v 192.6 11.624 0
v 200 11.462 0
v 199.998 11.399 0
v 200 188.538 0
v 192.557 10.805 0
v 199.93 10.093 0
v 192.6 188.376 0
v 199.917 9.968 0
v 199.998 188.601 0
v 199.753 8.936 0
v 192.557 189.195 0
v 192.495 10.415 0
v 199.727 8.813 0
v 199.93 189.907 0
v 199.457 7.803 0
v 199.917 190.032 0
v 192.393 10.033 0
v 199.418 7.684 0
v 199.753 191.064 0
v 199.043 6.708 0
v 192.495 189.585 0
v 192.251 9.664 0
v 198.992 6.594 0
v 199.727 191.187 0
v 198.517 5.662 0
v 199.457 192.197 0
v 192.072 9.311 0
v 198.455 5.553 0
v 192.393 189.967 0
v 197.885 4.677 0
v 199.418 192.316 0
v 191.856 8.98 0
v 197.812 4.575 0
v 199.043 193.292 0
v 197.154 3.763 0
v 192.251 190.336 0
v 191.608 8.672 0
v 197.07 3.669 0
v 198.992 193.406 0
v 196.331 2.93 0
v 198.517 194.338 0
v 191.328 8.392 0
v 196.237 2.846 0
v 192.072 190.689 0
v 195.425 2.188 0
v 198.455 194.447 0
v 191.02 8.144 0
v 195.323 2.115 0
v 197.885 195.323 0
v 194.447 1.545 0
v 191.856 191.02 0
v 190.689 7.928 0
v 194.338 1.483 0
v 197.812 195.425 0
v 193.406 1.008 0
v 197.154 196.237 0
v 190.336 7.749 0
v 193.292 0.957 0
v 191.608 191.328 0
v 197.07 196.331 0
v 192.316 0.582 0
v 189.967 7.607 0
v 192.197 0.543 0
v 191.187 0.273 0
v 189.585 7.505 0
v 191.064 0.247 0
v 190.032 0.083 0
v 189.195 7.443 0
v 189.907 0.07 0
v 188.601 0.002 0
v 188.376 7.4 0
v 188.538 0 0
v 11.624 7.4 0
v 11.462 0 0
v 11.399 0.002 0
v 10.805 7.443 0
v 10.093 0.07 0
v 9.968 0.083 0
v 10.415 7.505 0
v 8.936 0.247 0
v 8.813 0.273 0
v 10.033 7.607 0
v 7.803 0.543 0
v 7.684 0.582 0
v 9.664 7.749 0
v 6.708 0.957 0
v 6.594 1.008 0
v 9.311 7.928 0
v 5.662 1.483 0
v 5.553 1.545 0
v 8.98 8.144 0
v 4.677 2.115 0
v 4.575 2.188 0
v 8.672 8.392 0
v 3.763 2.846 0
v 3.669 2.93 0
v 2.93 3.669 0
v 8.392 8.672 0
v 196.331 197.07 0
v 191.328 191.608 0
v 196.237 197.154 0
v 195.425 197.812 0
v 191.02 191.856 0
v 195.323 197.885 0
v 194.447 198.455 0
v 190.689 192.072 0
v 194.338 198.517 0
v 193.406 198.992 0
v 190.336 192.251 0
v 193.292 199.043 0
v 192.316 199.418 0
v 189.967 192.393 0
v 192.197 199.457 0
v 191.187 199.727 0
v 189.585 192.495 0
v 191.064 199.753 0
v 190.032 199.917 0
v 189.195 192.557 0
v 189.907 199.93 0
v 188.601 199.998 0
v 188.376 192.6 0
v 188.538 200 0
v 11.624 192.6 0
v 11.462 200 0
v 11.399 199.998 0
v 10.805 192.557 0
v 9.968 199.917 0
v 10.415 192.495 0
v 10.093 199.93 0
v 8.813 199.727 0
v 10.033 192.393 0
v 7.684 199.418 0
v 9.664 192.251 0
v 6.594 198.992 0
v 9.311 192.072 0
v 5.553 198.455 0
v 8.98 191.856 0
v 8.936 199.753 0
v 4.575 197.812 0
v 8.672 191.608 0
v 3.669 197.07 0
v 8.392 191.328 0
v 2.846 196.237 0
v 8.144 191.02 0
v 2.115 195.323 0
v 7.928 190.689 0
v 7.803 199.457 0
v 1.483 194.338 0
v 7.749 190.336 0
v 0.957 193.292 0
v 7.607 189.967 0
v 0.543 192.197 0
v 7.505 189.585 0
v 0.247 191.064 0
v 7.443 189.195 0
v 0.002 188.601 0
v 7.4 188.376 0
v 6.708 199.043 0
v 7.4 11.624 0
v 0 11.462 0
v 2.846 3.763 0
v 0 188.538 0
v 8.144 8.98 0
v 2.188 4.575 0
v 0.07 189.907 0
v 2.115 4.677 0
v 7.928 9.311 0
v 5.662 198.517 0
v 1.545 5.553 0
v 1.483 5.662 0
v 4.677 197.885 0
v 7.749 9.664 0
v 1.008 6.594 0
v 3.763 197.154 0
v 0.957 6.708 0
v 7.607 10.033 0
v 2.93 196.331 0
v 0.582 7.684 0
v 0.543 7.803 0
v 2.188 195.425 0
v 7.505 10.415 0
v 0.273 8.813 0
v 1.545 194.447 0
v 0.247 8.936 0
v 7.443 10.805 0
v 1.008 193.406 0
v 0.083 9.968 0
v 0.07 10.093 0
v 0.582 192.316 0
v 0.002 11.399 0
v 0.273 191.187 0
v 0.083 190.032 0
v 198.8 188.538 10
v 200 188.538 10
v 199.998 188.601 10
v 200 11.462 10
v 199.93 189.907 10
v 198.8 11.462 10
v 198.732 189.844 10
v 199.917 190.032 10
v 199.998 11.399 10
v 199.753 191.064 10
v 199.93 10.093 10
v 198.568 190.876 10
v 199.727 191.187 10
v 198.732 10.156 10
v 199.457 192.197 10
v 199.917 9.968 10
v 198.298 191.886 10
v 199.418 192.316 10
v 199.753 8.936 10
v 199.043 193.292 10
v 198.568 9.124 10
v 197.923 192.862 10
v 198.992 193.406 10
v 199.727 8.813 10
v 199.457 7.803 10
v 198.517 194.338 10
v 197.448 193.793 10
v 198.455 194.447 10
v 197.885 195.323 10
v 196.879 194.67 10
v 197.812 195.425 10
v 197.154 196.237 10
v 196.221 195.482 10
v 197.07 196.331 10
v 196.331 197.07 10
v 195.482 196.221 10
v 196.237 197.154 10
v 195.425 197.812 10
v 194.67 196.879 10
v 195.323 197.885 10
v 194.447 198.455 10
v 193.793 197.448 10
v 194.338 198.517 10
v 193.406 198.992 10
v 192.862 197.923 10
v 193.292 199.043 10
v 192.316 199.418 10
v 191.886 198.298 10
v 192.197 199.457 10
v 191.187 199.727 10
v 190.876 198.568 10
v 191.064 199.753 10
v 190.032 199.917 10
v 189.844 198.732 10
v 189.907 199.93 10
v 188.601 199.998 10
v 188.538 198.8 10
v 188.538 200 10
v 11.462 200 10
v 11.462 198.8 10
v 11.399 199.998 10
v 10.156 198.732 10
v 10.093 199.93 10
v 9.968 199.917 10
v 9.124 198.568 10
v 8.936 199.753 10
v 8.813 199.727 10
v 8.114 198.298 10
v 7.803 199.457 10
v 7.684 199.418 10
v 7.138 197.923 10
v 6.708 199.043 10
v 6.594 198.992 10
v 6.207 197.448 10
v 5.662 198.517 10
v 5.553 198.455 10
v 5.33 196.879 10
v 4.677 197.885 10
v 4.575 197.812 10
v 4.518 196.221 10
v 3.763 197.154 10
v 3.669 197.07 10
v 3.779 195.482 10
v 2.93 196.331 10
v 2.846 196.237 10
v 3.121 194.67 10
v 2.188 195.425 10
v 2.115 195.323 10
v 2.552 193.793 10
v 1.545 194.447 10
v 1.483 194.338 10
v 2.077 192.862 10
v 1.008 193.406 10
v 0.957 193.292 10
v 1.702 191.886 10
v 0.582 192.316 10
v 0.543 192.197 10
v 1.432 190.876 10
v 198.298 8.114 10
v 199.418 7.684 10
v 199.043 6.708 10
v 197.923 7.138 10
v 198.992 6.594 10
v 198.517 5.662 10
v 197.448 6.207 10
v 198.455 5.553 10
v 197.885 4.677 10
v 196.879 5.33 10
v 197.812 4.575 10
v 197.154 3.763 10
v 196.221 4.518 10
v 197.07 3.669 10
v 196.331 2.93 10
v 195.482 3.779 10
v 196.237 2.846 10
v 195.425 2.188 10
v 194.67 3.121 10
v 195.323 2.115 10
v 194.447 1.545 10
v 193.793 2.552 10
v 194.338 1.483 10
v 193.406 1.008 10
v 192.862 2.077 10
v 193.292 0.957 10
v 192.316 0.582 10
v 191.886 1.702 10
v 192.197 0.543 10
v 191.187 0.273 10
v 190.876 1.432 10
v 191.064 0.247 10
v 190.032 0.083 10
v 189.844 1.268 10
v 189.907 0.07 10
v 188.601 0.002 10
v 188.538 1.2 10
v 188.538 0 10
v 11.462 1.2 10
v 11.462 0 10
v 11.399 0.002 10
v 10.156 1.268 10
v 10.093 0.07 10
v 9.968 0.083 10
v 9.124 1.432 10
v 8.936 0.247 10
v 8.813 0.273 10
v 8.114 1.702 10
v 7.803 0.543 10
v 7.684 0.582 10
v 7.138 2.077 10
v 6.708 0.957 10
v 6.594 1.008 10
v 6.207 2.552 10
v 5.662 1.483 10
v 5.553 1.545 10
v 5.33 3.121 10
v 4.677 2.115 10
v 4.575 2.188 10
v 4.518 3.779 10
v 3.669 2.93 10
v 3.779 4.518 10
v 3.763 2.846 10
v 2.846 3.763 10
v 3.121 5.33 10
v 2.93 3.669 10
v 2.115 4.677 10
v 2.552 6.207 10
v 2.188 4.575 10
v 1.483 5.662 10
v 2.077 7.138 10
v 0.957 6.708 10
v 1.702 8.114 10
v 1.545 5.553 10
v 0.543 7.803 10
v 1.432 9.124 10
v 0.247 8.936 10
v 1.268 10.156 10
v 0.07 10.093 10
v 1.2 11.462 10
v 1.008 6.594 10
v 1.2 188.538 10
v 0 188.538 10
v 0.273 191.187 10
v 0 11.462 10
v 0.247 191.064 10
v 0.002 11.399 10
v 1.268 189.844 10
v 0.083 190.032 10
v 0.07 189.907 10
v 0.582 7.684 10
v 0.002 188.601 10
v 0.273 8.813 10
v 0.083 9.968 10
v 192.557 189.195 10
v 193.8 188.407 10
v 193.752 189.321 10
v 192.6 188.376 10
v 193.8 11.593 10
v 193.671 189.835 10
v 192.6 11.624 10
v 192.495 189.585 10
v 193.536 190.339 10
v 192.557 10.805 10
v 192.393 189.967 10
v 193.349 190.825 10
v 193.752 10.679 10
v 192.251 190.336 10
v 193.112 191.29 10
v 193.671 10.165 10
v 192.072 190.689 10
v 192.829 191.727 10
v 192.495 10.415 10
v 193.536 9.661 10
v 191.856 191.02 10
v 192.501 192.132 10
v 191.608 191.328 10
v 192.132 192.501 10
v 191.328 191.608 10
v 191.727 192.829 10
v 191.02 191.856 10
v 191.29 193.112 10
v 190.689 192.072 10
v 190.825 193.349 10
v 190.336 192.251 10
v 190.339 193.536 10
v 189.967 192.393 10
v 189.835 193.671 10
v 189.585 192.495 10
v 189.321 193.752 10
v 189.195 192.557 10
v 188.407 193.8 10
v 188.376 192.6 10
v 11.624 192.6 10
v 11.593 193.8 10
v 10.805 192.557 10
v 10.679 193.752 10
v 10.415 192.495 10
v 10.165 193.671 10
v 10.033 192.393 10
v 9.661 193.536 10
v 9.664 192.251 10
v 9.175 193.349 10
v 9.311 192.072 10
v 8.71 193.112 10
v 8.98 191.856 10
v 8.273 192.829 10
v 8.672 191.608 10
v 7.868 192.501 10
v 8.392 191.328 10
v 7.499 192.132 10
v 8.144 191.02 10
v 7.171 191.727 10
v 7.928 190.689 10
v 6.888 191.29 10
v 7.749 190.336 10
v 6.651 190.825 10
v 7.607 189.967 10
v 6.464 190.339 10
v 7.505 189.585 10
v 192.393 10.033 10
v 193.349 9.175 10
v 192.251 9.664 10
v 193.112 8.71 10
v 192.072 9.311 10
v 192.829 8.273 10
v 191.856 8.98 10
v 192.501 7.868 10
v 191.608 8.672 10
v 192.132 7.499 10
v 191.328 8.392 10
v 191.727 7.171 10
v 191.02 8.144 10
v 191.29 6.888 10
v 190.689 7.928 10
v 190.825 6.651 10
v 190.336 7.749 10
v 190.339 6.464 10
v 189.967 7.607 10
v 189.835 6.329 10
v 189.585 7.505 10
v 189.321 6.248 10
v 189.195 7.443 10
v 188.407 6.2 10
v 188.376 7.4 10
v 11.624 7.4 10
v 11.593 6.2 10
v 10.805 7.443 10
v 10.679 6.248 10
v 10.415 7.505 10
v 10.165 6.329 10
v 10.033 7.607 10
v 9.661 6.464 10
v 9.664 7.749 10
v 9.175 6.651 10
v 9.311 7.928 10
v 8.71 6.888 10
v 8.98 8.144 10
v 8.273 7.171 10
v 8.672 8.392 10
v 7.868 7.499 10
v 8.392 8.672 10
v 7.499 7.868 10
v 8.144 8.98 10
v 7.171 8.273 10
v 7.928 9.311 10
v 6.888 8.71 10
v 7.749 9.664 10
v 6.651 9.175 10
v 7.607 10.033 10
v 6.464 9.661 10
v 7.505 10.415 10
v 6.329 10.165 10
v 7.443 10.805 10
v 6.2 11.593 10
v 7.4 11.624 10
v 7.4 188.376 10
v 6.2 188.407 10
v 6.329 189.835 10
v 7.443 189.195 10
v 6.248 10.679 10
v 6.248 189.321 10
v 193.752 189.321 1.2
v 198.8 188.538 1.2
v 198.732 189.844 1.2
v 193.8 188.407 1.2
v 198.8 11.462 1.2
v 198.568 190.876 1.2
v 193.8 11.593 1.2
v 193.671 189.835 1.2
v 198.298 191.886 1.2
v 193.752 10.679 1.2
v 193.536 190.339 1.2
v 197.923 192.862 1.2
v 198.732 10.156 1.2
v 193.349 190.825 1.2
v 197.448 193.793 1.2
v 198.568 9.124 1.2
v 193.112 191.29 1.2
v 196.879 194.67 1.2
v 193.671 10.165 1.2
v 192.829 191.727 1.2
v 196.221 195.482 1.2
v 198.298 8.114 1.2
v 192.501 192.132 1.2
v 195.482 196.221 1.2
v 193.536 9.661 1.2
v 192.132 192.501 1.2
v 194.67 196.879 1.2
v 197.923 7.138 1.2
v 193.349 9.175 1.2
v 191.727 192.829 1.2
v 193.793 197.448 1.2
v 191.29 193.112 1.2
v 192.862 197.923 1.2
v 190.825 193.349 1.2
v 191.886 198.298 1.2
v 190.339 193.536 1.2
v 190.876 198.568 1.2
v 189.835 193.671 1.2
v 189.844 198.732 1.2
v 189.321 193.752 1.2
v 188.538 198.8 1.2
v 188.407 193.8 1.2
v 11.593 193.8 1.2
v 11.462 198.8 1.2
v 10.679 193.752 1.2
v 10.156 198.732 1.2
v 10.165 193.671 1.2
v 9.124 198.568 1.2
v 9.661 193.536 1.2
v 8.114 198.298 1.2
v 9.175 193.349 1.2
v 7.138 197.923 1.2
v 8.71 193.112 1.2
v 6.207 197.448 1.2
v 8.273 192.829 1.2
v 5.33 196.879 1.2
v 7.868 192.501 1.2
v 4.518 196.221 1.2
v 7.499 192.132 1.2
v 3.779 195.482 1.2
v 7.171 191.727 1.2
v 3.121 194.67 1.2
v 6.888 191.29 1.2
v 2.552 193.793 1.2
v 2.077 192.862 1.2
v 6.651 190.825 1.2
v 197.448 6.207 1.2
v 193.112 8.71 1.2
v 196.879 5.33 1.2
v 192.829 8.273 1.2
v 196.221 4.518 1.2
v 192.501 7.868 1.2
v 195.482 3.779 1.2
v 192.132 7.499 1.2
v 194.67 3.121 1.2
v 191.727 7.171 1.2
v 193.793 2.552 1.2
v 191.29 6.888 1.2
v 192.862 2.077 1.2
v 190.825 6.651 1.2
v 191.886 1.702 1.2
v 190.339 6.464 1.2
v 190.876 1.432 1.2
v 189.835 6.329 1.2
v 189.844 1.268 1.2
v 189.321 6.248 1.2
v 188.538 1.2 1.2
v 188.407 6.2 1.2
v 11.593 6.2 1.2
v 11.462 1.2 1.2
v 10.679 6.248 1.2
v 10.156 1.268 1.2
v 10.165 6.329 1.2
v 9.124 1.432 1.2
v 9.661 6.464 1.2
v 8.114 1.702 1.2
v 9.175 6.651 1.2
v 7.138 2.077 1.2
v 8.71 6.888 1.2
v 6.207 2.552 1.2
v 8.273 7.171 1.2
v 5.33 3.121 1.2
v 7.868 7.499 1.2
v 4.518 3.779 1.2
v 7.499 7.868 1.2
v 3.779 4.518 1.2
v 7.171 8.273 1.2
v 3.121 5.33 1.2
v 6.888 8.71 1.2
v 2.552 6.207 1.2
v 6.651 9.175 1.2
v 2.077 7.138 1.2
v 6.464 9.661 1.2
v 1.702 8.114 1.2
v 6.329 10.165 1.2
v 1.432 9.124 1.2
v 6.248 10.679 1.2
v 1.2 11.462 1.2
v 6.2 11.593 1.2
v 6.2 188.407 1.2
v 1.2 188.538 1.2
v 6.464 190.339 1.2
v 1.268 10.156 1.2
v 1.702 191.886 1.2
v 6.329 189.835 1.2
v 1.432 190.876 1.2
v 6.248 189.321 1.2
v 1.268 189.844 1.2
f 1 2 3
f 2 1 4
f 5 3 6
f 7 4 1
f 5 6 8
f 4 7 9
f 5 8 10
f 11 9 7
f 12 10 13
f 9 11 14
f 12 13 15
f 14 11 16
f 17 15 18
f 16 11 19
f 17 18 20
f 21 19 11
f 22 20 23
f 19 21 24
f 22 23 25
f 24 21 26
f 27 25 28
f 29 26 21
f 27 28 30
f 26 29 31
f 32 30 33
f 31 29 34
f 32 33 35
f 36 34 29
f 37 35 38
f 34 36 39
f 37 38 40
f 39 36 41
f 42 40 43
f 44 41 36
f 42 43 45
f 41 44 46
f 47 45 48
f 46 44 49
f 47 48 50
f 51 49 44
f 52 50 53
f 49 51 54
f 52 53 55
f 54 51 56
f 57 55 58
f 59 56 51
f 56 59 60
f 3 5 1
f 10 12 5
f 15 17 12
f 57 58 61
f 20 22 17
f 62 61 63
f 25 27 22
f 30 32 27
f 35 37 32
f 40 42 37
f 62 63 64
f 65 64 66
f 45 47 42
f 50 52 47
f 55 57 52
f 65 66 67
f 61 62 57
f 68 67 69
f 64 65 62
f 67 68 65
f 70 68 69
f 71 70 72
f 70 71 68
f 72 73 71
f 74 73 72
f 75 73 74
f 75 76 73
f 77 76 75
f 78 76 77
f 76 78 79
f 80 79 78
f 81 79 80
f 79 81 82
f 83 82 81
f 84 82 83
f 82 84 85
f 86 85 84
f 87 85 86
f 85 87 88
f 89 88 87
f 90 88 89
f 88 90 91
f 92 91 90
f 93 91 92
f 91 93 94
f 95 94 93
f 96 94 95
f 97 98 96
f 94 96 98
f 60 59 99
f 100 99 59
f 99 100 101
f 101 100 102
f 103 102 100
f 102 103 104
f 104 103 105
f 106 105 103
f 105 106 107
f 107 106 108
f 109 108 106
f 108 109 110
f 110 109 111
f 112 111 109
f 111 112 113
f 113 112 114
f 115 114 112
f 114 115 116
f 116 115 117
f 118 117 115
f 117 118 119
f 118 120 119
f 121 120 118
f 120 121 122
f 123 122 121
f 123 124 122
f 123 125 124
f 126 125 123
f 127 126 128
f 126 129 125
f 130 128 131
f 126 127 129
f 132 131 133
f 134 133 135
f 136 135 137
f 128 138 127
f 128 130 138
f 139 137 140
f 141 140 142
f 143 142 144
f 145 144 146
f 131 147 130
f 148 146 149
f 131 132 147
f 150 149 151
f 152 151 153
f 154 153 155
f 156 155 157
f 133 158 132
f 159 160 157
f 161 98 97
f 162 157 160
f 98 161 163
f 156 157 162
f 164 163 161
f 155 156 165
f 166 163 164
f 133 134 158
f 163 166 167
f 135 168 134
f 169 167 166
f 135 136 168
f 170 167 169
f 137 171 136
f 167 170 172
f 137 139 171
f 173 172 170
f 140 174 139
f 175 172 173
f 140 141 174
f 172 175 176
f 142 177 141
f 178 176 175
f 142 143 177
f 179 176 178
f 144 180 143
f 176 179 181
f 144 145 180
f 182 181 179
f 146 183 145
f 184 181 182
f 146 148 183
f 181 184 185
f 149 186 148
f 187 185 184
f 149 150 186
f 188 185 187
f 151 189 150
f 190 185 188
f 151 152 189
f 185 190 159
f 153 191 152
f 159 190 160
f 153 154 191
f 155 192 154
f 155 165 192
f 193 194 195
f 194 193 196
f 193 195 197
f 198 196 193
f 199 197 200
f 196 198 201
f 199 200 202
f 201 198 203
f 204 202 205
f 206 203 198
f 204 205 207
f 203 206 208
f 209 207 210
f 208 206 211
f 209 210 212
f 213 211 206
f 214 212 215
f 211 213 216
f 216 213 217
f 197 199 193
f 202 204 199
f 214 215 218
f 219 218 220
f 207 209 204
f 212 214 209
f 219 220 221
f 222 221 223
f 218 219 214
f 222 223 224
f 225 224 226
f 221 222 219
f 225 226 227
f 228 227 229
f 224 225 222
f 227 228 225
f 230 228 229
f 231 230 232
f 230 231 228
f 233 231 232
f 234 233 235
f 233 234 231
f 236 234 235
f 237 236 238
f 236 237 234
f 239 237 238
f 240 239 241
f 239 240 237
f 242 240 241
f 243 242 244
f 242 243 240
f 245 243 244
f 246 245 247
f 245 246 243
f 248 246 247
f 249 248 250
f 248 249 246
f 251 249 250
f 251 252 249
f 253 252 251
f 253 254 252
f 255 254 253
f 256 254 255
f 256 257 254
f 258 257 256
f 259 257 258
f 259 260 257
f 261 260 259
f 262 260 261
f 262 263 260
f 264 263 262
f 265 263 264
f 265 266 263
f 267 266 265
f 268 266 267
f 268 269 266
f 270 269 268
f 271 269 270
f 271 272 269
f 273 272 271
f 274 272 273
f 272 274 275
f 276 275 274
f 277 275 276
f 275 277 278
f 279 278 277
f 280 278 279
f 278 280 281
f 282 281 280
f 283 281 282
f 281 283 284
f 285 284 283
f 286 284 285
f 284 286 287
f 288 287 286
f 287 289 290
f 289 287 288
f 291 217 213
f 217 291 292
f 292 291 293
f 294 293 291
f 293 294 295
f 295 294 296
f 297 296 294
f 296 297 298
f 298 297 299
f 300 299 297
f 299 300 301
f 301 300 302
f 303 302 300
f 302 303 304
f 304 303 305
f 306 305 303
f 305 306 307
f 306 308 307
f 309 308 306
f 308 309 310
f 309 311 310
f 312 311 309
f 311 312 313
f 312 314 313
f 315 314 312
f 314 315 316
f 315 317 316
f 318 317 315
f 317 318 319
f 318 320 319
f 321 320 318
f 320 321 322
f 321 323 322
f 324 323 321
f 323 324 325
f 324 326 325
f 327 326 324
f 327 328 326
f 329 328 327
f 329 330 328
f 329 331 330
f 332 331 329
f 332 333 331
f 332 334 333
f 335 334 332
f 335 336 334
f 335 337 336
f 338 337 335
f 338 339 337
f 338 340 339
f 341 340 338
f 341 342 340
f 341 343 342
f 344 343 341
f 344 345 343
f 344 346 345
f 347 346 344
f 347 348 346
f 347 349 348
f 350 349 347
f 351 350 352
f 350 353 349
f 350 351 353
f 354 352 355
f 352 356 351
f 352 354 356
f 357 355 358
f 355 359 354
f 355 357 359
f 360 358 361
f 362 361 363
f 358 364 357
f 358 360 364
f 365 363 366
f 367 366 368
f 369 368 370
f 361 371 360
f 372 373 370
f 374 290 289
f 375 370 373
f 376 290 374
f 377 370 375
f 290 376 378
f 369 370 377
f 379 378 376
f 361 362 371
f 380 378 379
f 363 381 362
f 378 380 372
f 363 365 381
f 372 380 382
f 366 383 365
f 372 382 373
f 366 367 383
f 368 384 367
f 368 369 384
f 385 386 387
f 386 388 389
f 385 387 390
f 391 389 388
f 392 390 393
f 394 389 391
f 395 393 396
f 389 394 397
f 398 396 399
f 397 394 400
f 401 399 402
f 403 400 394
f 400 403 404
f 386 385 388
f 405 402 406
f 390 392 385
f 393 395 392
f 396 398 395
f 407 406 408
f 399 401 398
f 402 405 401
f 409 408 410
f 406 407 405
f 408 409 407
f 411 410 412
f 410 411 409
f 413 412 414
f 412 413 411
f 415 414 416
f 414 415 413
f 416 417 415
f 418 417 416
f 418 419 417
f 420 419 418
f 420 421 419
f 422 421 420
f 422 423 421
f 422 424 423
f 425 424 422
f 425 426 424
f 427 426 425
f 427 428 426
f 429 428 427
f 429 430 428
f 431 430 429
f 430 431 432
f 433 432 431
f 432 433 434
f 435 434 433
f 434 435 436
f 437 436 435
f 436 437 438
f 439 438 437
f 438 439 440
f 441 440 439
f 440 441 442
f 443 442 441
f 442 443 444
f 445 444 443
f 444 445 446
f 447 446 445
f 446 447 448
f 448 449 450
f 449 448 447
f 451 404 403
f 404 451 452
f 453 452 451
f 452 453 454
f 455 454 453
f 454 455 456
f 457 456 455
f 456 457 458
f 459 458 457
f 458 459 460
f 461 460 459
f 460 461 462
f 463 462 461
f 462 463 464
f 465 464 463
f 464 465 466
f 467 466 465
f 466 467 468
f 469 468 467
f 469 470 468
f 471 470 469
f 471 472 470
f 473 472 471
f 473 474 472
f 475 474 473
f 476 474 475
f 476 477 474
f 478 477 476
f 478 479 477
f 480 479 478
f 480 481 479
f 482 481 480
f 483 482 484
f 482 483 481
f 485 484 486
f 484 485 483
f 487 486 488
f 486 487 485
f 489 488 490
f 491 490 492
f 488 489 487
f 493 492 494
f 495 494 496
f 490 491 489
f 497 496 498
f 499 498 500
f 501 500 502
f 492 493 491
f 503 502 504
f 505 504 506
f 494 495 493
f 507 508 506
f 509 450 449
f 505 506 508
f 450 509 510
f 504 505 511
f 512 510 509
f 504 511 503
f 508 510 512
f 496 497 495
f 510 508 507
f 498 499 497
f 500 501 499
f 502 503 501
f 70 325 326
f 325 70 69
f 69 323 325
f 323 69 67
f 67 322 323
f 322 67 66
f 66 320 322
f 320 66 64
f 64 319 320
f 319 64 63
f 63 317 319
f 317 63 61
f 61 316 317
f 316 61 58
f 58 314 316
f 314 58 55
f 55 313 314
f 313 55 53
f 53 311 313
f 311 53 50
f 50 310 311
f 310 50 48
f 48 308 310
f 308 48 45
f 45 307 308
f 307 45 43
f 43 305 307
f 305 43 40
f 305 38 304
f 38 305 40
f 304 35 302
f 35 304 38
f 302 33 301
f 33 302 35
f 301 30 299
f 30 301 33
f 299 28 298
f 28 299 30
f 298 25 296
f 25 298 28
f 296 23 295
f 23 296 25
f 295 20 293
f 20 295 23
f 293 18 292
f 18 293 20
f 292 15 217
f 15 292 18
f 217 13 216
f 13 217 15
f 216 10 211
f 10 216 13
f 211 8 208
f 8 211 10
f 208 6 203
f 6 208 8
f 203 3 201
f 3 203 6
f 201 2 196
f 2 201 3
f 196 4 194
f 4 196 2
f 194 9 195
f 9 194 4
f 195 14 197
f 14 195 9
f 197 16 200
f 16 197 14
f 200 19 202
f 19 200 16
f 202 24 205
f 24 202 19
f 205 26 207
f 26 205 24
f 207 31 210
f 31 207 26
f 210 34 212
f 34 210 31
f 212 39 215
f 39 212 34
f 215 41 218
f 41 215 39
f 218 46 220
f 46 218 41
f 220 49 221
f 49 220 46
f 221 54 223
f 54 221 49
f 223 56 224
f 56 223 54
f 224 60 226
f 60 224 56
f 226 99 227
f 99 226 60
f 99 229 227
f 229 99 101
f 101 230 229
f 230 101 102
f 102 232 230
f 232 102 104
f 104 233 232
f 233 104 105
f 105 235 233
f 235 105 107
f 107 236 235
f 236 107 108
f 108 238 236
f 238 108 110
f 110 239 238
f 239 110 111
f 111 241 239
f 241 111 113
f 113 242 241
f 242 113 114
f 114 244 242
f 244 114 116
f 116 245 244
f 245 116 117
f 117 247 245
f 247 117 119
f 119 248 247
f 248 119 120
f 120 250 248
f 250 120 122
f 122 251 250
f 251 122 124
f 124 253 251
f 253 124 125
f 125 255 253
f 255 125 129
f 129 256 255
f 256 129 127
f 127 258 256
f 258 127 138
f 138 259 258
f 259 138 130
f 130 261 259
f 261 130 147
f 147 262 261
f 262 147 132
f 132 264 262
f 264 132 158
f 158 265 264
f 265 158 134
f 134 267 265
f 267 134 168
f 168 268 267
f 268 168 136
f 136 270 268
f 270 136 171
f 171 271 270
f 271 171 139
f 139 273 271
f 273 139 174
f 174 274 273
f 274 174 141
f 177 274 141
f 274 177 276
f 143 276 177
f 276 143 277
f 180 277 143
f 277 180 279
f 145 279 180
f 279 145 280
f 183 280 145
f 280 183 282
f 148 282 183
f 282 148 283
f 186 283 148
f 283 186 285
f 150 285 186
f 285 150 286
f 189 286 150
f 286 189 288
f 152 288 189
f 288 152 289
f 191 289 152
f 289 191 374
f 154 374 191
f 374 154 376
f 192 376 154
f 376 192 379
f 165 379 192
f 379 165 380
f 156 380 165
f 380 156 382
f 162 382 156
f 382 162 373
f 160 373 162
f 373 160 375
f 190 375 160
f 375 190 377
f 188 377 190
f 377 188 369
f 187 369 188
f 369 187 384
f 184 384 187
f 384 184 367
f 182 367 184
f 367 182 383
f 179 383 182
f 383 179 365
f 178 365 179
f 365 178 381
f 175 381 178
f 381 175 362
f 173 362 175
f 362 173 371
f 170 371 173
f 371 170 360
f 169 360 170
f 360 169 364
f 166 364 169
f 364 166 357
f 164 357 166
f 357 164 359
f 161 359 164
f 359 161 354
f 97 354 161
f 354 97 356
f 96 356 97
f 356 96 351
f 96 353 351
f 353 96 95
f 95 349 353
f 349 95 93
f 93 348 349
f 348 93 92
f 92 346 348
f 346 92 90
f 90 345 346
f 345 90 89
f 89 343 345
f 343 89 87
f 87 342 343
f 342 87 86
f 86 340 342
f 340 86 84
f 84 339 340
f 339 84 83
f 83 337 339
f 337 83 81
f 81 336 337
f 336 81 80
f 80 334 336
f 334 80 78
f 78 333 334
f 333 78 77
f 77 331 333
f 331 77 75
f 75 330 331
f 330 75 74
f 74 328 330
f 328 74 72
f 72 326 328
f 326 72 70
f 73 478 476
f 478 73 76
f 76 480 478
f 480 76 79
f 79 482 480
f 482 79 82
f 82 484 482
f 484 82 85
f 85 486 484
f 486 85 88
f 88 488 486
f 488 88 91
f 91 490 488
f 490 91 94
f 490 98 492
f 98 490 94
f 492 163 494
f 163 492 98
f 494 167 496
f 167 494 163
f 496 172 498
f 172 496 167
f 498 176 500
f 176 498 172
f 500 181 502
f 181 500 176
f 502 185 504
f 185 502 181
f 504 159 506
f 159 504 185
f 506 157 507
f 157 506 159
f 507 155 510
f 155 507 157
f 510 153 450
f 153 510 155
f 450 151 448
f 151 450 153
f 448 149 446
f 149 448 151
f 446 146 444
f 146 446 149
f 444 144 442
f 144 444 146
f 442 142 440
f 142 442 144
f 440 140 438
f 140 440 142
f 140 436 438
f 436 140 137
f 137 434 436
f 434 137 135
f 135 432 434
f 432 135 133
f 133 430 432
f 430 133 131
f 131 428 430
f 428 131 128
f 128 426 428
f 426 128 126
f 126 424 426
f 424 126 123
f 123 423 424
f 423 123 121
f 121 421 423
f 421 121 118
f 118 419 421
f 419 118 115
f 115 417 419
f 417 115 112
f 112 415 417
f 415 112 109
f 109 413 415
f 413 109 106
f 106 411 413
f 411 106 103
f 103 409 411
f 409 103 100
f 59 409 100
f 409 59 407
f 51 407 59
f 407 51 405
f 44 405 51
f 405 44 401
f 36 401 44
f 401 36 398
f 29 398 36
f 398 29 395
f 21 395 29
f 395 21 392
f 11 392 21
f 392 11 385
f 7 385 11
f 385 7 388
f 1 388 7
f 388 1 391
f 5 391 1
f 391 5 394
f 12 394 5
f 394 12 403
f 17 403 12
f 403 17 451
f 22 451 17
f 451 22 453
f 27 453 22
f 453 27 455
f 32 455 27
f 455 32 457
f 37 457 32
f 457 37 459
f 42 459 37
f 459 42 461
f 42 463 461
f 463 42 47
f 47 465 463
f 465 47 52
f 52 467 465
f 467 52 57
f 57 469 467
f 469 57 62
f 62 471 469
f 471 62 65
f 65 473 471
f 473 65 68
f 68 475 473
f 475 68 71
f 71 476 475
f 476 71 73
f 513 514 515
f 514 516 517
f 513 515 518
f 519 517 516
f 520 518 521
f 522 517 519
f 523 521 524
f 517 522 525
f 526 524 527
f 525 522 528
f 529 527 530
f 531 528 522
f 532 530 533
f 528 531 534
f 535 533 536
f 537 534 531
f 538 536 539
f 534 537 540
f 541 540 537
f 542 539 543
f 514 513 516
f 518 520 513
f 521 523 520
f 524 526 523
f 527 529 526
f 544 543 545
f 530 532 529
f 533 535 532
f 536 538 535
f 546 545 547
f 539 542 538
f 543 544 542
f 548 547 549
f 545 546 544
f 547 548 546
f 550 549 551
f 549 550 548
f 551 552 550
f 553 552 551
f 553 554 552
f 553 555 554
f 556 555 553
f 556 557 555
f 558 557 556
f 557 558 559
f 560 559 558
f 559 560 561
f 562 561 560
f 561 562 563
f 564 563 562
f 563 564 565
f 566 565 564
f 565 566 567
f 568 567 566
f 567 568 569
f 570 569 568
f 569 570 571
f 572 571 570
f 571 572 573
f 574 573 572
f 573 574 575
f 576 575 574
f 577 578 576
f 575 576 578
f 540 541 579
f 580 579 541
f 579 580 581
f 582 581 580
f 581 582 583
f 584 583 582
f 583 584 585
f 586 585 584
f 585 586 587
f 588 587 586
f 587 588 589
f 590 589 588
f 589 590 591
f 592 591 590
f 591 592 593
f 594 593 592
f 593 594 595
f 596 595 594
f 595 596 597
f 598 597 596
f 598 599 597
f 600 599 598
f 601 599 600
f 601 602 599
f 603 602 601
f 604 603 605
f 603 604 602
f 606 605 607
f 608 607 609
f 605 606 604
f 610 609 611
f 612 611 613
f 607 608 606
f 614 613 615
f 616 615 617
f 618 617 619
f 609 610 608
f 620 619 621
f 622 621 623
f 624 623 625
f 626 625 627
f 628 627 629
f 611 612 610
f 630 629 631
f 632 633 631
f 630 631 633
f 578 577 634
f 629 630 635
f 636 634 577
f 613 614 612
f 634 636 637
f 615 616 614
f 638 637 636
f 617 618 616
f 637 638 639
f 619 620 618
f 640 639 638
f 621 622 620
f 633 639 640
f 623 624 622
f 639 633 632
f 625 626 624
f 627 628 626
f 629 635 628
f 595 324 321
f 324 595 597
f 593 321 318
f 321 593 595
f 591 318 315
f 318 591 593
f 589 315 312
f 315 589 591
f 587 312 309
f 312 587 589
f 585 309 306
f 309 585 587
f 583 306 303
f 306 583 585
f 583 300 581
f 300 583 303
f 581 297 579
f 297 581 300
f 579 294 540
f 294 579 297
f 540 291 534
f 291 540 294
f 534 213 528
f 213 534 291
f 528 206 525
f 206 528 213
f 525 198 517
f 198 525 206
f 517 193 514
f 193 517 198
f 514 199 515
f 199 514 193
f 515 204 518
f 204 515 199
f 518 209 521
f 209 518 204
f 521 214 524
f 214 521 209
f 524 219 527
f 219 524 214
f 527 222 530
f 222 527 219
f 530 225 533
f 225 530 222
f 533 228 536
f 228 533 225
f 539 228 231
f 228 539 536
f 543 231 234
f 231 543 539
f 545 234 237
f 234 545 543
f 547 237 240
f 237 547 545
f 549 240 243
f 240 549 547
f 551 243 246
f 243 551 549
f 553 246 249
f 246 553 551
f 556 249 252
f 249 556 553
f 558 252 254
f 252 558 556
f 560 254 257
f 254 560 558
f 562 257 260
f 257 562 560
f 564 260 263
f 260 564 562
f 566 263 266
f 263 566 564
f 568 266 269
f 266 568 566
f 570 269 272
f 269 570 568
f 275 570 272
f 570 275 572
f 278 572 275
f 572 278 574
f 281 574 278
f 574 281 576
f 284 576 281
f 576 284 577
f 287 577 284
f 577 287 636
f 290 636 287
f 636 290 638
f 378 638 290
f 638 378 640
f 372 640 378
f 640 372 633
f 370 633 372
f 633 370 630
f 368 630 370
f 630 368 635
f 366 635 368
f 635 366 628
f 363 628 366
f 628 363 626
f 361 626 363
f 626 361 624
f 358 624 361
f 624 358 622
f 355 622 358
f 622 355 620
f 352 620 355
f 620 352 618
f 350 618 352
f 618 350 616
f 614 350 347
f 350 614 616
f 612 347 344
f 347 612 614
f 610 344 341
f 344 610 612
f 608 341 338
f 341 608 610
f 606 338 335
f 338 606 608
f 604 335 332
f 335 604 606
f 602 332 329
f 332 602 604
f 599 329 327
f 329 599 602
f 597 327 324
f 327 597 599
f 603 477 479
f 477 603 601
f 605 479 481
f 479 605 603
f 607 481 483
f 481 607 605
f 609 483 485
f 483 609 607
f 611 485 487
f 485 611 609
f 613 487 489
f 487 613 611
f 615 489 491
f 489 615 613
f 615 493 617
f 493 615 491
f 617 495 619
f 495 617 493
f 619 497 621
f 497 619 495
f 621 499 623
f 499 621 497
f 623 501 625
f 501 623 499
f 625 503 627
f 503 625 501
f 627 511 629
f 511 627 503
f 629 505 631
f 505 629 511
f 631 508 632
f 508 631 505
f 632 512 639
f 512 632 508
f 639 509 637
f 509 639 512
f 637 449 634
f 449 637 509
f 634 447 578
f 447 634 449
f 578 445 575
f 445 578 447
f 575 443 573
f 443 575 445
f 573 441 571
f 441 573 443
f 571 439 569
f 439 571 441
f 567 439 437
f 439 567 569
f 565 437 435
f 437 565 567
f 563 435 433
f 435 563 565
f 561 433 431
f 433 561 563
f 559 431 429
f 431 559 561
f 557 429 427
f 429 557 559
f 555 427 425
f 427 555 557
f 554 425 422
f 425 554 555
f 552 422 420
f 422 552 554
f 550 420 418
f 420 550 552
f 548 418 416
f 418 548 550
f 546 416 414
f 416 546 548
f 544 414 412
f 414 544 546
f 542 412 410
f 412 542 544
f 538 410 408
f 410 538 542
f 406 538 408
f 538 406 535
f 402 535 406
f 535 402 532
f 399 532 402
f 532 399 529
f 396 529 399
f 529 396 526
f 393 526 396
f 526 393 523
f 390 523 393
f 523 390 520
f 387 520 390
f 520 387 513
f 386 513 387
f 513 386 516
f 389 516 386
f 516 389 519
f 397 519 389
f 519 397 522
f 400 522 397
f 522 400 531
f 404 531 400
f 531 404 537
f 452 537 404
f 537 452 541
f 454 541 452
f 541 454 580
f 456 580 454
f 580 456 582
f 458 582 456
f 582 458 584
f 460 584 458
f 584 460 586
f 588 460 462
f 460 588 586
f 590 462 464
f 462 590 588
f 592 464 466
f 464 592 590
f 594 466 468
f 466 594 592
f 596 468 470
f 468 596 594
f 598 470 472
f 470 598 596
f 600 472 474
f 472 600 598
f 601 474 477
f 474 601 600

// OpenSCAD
// file: include/LEDneon.scad
// OpenSCAD LED neon modules
// to be included in own OpenSCAD scripts
//

module roundoff2d(rr=20) {
    offset(r=-rr/2)
        offset(r=rr)
            children();
}

module genslot2d(sw=5) {
    difference() {
        children();
        offset(r=-sw)
            children();
    }
}

module genslot3d(sw=5, rr=20, h=10) {
    linear_extrude(height=h)
        genslot2d(sw=sw)
            roundoff2d(rr=rr)
                children();
}

module wall3d(ww=1.2, sw=5, rr=20, h=10) {
    linear_extrude(height=h)
        offset(r=ww)
            genslot2d(sw=sw)
                roundoff2d(rr=rr)
                    children();
}

module frame3d(ww=1.2, sw=5, rr=20, h=10, fl=1.2) {
    difference() {
        wall3d(ww=ww, sw=sw, rr=rr, h=h)
            children();
        translate([0,0,fl])
            genslot3d(sw=sw, rr=rr, h=h)
                children();
    }
}
// file: include/shapes2D.scad
// Some 2D shapes for LED neon
// to be included in own OpenSCAD scripts
//

module ngon2d(n=6, r=100) {
    delta = 360 / n;
    pp = [
        for(i = [0:n-1])
            [sin(i*delta)*r, cos(i*delta)*r] 
    ];
    polygon(pp);
}

module star2d(points=5, ro=100, ri=30) {
    delta = 180 / points;
    rd = ro - ri;
    pp = [
        for(i = [0:2*points-1])
            [sin(i*delta)*(ro-rd*(i%2)), cos(i*delta)*(ro-rd*(i%2))] 
    ];
    polygon(pp);
}

module letterC2d(ro=100, ri=70) {
    difference() {
        circle(r=ro);
        circle(r=ri);
        rotate([0,0,-45])
            square(ro);
    }
}

module letterO2d(ro=100, ri=70) {
    difference() {
        circle(r=ro);
        circle(r=ri);
    }
}
// file: neon-dimension.scad
//Rounding radius
rr = 18;

//Slot (tape) width (<rr/2)
sw = 5;

//Total height (incl. floor)
h = 10;

//Wall width
ww = 1.2;

//Floor height
fl = 1.2;
// main file
// OpenSCAD LED neon square
//

//Global parameters for the dimension of the LED neon tape
include <neon-dimension.scad>

//You can change the global settings for individual shapes:
//Rounding radius
rr = 20;

//Size
size = 200 - rr - 2 * ww;

///////////////////////////
$fn=60;

include <include/shapes2D.scad>;
include <include/LEDneon.scad>;

translate([rr/2+ww, rr/2+ww, 0])
    frame3d(ww=ww, sw=sw, rr=rr, h=h) {
        square(size=size);
}
